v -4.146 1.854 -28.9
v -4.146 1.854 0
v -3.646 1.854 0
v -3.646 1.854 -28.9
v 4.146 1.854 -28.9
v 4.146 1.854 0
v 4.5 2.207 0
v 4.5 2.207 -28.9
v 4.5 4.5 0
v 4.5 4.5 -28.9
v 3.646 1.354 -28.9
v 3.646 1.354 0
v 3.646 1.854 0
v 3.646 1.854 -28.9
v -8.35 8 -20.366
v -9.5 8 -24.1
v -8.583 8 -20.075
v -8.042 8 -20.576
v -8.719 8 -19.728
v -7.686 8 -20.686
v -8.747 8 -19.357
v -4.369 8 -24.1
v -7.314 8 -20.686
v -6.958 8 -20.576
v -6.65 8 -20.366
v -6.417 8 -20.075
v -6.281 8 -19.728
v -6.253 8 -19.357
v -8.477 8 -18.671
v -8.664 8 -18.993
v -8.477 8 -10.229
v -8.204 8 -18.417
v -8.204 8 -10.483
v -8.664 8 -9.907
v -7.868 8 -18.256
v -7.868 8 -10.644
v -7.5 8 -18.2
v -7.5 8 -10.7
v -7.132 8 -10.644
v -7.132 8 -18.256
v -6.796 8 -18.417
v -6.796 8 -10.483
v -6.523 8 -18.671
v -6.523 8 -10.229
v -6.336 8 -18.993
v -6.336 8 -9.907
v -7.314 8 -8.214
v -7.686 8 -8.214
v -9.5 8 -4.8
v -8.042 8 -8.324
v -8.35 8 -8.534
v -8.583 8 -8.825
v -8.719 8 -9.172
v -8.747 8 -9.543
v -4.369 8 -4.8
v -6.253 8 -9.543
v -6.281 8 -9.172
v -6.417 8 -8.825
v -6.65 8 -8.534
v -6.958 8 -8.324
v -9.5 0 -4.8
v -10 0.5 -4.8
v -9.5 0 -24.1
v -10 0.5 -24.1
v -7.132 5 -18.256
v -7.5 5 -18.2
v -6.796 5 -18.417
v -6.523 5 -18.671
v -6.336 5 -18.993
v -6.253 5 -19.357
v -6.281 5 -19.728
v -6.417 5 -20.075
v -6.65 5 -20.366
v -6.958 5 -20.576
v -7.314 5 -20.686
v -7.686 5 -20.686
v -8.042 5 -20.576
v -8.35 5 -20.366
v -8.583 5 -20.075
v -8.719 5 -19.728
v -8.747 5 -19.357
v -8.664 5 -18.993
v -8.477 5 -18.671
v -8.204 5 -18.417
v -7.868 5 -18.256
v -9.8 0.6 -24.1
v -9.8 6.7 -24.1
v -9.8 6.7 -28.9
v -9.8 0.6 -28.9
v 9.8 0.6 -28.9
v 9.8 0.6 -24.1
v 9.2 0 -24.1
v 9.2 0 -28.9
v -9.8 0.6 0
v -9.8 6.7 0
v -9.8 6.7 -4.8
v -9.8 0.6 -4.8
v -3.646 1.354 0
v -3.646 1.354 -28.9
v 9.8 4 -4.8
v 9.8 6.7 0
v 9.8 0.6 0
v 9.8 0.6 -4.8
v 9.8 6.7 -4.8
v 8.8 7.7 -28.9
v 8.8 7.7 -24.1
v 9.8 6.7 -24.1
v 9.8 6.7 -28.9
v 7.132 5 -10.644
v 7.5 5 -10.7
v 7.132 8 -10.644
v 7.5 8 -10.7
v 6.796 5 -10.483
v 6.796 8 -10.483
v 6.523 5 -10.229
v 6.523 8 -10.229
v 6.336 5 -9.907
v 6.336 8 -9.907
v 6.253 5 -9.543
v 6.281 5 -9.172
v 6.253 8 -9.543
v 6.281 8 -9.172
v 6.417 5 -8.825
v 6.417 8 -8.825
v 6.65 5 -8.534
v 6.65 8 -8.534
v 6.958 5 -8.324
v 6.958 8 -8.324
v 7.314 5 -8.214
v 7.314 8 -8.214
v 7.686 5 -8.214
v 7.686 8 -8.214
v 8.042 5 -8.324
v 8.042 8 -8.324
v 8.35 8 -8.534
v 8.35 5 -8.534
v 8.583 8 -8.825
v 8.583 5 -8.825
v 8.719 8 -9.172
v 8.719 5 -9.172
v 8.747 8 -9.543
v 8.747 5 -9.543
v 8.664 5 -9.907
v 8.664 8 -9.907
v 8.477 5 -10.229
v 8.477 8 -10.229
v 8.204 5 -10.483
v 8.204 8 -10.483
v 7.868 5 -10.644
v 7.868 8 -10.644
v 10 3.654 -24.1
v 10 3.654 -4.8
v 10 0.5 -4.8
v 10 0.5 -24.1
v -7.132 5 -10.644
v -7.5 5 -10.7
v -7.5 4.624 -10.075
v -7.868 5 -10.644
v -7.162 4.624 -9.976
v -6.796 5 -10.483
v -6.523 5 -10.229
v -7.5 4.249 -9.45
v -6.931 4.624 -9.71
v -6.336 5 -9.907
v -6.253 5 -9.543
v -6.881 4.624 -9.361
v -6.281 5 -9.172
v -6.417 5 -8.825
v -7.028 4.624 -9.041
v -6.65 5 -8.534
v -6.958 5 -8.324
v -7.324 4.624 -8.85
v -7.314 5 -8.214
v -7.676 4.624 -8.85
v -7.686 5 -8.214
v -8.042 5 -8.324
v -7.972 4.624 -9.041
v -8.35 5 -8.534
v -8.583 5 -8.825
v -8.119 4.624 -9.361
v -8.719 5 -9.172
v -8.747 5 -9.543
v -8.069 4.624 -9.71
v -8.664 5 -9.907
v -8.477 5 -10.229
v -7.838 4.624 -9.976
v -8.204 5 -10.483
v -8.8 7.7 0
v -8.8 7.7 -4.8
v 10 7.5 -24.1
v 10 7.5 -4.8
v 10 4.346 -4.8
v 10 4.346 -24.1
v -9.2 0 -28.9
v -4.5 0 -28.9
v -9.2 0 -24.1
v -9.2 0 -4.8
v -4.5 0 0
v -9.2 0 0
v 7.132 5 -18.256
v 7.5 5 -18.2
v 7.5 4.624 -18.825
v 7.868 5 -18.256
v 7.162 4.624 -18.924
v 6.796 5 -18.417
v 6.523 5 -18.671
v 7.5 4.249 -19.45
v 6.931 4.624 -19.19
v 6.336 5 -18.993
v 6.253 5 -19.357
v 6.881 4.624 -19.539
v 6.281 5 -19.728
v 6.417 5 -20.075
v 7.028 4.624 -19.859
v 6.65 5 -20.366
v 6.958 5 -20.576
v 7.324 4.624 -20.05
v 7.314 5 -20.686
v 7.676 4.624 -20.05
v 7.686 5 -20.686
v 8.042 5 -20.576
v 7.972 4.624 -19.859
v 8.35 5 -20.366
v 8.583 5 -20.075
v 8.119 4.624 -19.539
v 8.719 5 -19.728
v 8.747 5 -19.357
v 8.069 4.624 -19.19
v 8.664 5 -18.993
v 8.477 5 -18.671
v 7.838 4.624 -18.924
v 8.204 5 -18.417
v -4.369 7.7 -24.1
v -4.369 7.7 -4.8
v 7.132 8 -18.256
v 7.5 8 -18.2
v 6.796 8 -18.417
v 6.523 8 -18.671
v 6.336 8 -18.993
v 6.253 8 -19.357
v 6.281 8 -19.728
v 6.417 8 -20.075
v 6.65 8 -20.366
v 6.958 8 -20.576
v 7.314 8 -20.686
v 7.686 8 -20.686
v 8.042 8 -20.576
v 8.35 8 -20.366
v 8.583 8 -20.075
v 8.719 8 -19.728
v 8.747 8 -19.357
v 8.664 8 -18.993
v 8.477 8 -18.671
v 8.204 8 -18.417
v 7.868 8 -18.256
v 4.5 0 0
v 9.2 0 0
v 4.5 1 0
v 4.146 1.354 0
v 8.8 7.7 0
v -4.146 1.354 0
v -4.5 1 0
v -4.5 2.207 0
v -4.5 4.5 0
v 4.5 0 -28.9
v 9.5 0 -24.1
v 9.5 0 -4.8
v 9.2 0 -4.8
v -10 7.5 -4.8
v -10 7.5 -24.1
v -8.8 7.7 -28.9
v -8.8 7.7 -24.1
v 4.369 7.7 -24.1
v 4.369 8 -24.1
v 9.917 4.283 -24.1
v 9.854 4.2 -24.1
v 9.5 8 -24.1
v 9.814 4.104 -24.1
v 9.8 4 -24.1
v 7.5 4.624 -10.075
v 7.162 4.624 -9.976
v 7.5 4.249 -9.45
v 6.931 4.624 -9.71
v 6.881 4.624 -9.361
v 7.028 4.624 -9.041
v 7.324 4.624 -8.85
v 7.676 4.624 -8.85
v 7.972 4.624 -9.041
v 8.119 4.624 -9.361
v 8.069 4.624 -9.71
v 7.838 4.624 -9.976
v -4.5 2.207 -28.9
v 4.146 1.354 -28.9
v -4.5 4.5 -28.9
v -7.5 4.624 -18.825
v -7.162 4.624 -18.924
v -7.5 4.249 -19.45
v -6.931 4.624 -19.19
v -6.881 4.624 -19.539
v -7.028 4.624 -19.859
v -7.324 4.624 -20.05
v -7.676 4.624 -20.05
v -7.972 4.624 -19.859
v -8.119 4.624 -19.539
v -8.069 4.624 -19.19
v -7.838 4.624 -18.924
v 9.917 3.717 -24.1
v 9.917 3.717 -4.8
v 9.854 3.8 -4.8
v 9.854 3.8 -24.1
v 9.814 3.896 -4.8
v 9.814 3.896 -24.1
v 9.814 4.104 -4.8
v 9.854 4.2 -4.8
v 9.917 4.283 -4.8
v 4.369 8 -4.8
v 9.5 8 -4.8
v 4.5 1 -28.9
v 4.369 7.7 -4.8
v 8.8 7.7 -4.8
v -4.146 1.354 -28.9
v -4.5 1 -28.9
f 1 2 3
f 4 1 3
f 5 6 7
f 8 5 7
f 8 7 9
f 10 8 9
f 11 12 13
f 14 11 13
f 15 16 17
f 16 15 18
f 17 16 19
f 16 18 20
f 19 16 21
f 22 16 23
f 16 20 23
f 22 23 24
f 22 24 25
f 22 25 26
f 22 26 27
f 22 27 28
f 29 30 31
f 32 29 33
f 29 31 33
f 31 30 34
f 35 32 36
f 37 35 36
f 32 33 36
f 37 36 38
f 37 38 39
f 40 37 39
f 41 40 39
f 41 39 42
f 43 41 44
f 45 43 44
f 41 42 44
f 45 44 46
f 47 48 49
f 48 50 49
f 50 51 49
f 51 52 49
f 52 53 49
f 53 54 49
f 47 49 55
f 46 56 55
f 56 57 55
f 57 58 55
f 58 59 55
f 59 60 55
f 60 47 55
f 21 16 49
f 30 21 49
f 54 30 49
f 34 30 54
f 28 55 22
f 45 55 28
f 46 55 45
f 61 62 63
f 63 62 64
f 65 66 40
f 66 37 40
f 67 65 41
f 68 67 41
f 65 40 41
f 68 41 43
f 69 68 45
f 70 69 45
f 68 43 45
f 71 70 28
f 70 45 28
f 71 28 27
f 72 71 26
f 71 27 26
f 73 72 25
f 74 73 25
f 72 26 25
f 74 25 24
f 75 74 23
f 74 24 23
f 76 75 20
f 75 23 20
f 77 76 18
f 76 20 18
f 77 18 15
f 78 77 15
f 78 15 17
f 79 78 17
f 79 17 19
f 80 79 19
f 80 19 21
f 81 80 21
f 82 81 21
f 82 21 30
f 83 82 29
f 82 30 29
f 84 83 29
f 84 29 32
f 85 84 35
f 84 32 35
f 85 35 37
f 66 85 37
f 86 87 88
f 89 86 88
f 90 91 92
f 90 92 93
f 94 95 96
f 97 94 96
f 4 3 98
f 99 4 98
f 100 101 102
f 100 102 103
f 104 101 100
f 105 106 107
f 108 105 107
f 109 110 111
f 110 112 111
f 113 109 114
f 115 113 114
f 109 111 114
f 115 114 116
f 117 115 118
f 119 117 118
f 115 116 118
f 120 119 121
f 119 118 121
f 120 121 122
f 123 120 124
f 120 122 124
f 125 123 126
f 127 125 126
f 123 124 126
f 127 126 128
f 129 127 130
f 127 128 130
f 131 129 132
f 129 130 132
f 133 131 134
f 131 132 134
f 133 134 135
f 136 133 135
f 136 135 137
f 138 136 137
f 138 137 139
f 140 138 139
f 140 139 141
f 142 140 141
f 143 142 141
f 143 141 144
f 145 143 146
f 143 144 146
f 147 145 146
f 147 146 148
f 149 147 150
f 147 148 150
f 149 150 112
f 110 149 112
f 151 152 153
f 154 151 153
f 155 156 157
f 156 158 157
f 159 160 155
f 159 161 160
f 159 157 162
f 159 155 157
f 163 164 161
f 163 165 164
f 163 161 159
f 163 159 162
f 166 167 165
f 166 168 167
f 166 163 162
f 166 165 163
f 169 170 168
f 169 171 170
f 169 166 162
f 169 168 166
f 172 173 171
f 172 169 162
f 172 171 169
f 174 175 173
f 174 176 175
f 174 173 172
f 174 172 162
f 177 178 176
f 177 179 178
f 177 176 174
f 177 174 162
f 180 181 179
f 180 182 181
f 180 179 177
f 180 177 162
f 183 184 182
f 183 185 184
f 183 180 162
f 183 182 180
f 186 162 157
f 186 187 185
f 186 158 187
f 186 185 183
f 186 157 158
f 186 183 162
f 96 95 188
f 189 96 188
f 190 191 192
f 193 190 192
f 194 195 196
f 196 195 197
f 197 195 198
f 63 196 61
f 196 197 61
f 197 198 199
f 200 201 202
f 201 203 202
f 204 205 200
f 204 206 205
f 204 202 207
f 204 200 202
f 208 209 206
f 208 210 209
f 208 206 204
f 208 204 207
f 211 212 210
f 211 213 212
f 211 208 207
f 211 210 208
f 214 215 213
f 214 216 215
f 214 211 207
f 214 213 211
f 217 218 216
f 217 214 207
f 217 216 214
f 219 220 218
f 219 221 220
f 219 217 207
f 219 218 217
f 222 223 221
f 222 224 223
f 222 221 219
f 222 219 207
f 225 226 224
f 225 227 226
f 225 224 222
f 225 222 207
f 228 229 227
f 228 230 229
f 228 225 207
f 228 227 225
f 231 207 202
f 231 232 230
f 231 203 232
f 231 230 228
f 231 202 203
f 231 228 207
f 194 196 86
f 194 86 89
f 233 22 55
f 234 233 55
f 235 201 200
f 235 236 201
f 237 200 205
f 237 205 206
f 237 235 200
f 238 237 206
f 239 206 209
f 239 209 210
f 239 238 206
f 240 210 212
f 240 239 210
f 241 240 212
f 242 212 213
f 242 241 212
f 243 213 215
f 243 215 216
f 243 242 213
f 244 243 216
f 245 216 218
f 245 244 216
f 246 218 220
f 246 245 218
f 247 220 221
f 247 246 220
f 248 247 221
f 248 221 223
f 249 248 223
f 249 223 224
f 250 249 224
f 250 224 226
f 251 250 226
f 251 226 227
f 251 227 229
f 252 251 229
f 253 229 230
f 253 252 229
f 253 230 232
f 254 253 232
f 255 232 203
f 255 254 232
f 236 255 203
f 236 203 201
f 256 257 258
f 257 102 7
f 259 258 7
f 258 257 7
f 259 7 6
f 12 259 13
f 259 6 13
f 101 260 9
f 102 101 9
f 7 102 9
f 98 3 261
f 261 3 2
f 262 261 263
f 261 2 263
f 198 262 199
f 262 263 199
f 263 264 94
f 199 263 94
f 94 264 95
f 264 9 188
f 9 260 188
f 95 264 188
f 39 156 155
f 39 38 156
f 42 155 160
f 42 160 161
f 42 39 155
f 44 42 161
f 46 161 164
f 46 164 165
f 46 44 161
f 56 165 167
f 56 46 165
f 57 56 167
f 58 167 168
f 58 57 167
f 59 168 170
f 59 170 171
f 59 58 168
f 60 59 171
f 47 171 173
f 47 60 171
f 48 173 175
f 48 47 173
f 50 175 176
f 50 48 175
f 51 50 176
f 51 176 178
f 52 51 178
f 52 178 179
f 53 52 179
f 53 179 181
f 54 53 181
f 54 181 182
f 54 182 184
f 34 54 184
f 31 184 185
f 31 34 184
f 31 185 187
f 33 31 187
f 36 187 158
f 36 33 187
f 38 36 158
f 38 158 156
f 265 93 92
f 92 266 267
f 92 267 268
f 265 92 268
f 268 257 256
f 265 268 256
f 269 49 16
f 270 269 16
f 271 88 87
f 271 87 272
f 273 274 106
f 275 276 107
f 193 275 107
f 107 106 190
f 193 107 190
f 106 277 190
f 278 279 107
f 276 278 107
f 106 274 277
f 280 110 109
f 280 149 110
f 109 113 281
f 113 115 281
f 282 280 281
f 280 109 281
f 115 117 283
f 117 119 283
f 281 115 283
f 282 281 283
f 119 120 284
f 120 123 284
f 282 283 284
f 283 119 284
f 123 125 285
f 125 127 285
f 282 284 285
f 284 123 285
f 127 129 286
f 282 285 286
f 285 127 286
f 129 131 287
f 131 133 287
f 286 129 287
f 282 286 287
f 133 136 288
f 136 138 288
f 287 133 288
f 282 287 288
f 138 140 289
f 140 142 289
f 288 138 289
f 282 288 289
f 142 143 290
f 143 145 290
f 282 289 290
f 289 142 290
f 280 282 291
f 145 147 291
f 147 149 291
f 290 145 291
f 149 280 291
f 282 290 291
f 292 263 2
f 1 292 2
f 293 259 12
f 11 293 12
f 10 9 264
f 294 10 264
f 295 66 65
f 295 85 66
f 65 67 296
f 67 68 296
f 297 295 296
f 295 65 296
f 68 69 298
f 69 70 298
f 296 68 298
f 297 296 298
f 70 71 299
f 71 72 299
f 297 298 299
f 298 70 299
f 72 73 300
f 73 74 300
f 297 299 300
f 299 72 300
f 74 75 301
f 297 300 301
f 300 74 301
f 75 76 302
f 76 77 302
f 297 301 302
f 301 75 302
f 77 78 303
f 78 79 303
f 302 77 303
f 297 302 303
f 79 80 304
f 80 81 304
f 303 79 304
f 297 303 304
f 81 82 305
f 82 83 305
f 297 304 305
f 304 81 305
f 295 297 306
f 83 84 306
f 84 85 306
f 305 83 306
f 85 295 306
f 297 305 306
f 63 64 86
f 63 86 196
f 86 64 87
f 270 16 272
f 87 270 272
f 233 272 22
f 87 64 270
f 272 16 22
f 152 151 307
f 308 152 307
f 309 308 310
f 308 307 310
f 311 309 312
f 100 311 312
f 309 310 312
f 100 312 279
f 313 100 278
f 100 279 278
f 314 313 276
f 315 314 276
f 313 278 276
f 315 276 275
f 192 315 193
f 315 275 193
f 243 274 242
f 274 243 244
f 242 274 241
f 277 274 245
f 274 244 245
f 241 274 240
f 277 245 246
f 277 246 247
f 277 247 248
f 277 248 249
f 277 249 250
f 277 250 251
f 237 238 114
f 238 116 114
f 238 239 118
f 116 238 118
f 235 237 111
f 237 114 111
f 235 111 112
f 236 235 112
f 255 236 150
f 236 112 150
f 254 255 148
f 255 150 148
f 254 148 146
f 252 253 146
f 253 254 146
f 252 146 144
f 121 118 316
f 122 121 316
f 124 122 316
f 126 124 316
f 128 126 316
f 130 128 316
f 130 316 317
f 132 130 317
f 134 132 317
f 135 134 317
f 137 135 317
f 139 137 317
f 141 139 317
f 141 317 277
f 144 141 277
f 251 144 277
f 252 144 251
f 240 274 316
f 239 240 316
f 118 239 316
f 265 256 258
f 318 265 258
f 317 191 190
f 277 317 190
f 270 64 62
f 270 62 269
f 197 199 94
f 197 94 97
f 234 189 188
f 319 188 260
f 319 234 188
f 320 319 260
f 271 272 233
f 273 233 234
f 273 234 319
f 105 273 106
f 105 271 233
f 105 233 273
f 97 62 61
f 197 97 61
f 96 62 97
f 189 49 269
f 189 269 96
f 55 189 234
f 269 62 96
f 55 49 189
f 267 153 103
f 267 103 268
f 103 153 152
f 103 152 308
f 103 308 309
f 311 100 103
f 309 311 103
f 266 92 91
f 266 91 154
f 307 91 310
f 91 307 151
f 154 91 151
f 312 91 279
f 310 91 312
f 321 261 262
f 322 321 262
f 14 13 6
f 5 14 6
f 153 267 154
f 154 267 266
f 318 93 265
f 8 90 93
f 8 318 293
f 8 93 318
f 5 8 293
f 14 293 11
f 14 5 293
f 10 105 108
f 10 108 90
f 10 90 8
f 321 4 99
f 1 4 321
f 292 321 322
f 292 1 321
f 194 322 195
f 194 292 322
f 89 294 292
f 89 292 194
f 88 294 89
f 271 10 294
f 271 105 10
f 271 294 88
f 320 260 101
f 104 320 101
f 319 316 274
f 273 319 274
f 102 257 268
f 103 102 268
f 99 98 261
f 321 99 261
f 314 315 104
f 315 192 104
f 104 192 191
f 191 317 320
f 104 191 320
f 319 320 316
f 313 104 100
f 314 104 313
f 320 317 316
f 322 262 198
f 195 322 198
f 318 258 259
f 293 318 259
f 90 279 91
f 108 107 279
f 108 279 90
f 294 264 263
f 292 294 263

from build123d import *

# Parameters (mm, degrees)
EXTRUDE_1_DEPTH     = 28.9
CHAMFER_1_SIZE      = 0.5
CUT_EXTRUDE_1_DEPTH = 0.3
SKETCH_6_W          = 0.2
SKETCH_6_H          = 4.8
CUT_EXTRUDE_2_DEPTH = 8.3
CHAMFER_2_SIZE      = 1
CHAMFER_3_SIZE      = 0.6
CHAMFER_4_SIZE      = 0.5
SKETCH_7_R          = 0.4
CUT_EXTRUDE_3_DEPTH = 19.3


with BuildPart() as part:
    # 草图1 → 凸台-拉伸1 (new body)
    with BuildSketch(Plane.XY):
        Polygon((-10, 0), (-10, 8), (10, 8), (10, 0), (4.5, 0), (4.5, 1), (4.146446609, 1.353553391), (3.646446609, 1.353553391), (3.646446609, 1.853553391), (4.146446609, 1.853553391), (4.5, 2.207106781), (4.5, 4.5), (-4.5, 4.5), (-4.5, 2.207106781), (-4.146446609, 1.853553391), (-3.646446609, 1.853553391), (-3.646446609, 1.353553391), (-4.146446609, 1.353553391), (-4.5, 1), (-4.5, 0), align=None)
    extrude(amount=-EXTRUDE_1_DEPTH)

    # 草图3 → M3 螺纹孔1 (revolve, cut)
    with BuildSketch(Plane(origin=(7.5, 8, -19.45), x_dir=(0, 0, 1), z_dir=(1, 0, 0))):
        Polygon((0, 0), (0, 3.751075774), (1.25, 3), (1.25, 0), align=None)
    hole_wizard_m3_1 = revolve(axis=Axis((7.5, 14.35, -19.45), (0, -1, 0)), mode=Mode.SUBTRACT)

    # 镜向1: M3 螺纹孔1 across plane
    add(hole_wizard_m3_1.mirror(Plane(origin=(0, 0, -14.45), x_dir=(1, 0, 0), z_dir=(0, 0, -1))), mode=Mode.SUBTRACT)

    # 镜向2: M3 螺纹孔1 across plane
    add(hole_wizard_m3_1.mirror(Plane.ZY), mode=Mode.SUBTRACT)

    # 镜向2 copy 1 sketch → 镜向2 copy 1 (revolve, cut)
    with BuildSketch(Plane(origin=(-7.5, 8, -9.45), x_dir=(0, 0, -1), z_dir=(-1, 0, 0))):
        Polygon((0, 0), (0, 3.751075774), (1.25, 3), (1.25, 0), align=None)
    revolve(axis=Axis((-7.5, 14.35, -9.45), (0, -1, 0)), mode=Mode.SUBTRACT)

    # 倒角1
    chamfer_1_edges = [part.edges().sort_by_distance(p)[0] for p in [
        (10, 8, -14.45),
        (-10, 8, -14.45),
    ]]
    chamfer(chamfer_1_edges, length=CHAMFER_1_SIZE)

    # 草图5 → 切除-拉伸1 (cut)
    with BuildSketch(Plane(origin=(0, 8, 0), x_dir=(1, 0, 0), z_dir=(0, 1, 0))):
        Polygon((-9.5, 24.1), (-4.368581018, 24.1), (-4.368581018, 4.8), (-9.5, 4.8), (-10, 4.8), (-10, 0), (10, 0), (10, 4.8), (9.5, 4.8), (4.368581018, 4.8), (4.368581018, 24.1), (9.5, 24.1), (10, 24.1), (10, 28.9), (-10, 28.9), (-10, 24.1), align=None)
    extrude(amount=-CUT_EXTRUDE_1_DEPTH, mode=Mode.SUBTRACT)

    # 草图6 → 切除-拉伸2 (cut)
    with BuildSketch(Plane(origin=(0, 7.7, 0), x_dir=(1, 0, 0), z_dir=(0, 1, 0))):
        with Locations((-9.9, 26.5)):
            Rectangle(SKETCH_6_W, SKETCH_6_H)
        with Locations((9.9, 26.5)):
            Rectangle(SKETCH_6_W, SKETCH_6_H)
        with Locations((9.9, 2.4)):
            Rectangle(SKETCH_6_W, SKETCH_6_H)
        with Locations((-9.9, 2.4)):
            Rectangle(SKETCH_6_W, SKETCH_6_H)
    extrude(amount=-CUT_EXTRUDE_2_DEPTH, mode=Mode.SUBTRACT)

    # 倒角2
    # the kernel refuses this chamfer: 1 mm, written as the material it takes off along each edge
    with BuildSketch(Plane(origin=(-9.8, 7.7, -4.8), x_dir=(-0.027495876610583895, -0.9996219169112968, 0), z_dir=(0, 0, 1)), Plane(origin=(-9.8, 7.7, -31.471682988), x_dir=(-0.027495876610585623, -0.9996219169112968, 0), z_dir=(0, 0, 1))) as chamfer_2_piece_1:
        Polygon((CHAMFER_2_SIZE * 0.999621916911, CHAMFER_2_SIZE * 0.0274958766106), (-CHAMFER_2_SIZE * 0.0274958766106, CHAMFER_2_SIZE * 0.999621916911), (0, 0), align=None)
    extrude(amount=7.371682988, mode=Mode.SUBTRACT)
    with BuildSketch(Plane(origin=(9.8, 7.7, 2.571682988), x_dir=(-0.9996219169112968, 0.02749587661058651, 0), z_dir=(0, 0, -1)), Plane(origin=(9.8, 7.7, -24.1), x_dir=(-0.9996219169112968, 0.02749587661058651, 0), z_dir=(0, 0, -1))) as chamfer_2_piece_2:
        Polygon((CHAMFER_2_SIZE * 0.999621916911, -CHAMFER_2_SIZE * 0.0274958766106), (-CHAMFER_2_SIZE * 0.0274958766106, -CHAMFER_2_SIZE * 0.999621916911), (0, 0), align=None)
    extrude(amount=7.371682988, mode=Mode.SUBTRACT)

    # 倒角3
    chamfer_3_edges = [part.edges().sort_by_distance(p)[0] for p in [
        (-9.8, 0, -26.5),
        (9.8, 0, -26.5),
        (9.8, 0, -2.4),
        (-9.8, 0, -2.4),
    ]]
    chamfer(chamfer_3_edges, length=CHAMFER_3_SIZE)

    # 倒角4
    chamfer_4_edges = [part.edges().sort_by_distance(p)[0] for p in [
        (-10, 0, -14.45),
        (10, 0, -14.45),
    ]]
    chamfer(chamfer_4_edges, length=CHAMFER_4_SIZE)

    # 草图7 → 切除-拉伸3 (cut)
    with BuildSketch(Plane(origin=(0, 0, -24.1), x_dir=(-1, 0, 0), z_dir=(0, 0, -1))):
        with Locations((-10.2, 4)):
            Circle(SKETCH_7_R)
    extrude(amount=-CUT_EXTRUDE_3_DEPTH, mode=Mode.SUBTRACT)


solid = part.part
